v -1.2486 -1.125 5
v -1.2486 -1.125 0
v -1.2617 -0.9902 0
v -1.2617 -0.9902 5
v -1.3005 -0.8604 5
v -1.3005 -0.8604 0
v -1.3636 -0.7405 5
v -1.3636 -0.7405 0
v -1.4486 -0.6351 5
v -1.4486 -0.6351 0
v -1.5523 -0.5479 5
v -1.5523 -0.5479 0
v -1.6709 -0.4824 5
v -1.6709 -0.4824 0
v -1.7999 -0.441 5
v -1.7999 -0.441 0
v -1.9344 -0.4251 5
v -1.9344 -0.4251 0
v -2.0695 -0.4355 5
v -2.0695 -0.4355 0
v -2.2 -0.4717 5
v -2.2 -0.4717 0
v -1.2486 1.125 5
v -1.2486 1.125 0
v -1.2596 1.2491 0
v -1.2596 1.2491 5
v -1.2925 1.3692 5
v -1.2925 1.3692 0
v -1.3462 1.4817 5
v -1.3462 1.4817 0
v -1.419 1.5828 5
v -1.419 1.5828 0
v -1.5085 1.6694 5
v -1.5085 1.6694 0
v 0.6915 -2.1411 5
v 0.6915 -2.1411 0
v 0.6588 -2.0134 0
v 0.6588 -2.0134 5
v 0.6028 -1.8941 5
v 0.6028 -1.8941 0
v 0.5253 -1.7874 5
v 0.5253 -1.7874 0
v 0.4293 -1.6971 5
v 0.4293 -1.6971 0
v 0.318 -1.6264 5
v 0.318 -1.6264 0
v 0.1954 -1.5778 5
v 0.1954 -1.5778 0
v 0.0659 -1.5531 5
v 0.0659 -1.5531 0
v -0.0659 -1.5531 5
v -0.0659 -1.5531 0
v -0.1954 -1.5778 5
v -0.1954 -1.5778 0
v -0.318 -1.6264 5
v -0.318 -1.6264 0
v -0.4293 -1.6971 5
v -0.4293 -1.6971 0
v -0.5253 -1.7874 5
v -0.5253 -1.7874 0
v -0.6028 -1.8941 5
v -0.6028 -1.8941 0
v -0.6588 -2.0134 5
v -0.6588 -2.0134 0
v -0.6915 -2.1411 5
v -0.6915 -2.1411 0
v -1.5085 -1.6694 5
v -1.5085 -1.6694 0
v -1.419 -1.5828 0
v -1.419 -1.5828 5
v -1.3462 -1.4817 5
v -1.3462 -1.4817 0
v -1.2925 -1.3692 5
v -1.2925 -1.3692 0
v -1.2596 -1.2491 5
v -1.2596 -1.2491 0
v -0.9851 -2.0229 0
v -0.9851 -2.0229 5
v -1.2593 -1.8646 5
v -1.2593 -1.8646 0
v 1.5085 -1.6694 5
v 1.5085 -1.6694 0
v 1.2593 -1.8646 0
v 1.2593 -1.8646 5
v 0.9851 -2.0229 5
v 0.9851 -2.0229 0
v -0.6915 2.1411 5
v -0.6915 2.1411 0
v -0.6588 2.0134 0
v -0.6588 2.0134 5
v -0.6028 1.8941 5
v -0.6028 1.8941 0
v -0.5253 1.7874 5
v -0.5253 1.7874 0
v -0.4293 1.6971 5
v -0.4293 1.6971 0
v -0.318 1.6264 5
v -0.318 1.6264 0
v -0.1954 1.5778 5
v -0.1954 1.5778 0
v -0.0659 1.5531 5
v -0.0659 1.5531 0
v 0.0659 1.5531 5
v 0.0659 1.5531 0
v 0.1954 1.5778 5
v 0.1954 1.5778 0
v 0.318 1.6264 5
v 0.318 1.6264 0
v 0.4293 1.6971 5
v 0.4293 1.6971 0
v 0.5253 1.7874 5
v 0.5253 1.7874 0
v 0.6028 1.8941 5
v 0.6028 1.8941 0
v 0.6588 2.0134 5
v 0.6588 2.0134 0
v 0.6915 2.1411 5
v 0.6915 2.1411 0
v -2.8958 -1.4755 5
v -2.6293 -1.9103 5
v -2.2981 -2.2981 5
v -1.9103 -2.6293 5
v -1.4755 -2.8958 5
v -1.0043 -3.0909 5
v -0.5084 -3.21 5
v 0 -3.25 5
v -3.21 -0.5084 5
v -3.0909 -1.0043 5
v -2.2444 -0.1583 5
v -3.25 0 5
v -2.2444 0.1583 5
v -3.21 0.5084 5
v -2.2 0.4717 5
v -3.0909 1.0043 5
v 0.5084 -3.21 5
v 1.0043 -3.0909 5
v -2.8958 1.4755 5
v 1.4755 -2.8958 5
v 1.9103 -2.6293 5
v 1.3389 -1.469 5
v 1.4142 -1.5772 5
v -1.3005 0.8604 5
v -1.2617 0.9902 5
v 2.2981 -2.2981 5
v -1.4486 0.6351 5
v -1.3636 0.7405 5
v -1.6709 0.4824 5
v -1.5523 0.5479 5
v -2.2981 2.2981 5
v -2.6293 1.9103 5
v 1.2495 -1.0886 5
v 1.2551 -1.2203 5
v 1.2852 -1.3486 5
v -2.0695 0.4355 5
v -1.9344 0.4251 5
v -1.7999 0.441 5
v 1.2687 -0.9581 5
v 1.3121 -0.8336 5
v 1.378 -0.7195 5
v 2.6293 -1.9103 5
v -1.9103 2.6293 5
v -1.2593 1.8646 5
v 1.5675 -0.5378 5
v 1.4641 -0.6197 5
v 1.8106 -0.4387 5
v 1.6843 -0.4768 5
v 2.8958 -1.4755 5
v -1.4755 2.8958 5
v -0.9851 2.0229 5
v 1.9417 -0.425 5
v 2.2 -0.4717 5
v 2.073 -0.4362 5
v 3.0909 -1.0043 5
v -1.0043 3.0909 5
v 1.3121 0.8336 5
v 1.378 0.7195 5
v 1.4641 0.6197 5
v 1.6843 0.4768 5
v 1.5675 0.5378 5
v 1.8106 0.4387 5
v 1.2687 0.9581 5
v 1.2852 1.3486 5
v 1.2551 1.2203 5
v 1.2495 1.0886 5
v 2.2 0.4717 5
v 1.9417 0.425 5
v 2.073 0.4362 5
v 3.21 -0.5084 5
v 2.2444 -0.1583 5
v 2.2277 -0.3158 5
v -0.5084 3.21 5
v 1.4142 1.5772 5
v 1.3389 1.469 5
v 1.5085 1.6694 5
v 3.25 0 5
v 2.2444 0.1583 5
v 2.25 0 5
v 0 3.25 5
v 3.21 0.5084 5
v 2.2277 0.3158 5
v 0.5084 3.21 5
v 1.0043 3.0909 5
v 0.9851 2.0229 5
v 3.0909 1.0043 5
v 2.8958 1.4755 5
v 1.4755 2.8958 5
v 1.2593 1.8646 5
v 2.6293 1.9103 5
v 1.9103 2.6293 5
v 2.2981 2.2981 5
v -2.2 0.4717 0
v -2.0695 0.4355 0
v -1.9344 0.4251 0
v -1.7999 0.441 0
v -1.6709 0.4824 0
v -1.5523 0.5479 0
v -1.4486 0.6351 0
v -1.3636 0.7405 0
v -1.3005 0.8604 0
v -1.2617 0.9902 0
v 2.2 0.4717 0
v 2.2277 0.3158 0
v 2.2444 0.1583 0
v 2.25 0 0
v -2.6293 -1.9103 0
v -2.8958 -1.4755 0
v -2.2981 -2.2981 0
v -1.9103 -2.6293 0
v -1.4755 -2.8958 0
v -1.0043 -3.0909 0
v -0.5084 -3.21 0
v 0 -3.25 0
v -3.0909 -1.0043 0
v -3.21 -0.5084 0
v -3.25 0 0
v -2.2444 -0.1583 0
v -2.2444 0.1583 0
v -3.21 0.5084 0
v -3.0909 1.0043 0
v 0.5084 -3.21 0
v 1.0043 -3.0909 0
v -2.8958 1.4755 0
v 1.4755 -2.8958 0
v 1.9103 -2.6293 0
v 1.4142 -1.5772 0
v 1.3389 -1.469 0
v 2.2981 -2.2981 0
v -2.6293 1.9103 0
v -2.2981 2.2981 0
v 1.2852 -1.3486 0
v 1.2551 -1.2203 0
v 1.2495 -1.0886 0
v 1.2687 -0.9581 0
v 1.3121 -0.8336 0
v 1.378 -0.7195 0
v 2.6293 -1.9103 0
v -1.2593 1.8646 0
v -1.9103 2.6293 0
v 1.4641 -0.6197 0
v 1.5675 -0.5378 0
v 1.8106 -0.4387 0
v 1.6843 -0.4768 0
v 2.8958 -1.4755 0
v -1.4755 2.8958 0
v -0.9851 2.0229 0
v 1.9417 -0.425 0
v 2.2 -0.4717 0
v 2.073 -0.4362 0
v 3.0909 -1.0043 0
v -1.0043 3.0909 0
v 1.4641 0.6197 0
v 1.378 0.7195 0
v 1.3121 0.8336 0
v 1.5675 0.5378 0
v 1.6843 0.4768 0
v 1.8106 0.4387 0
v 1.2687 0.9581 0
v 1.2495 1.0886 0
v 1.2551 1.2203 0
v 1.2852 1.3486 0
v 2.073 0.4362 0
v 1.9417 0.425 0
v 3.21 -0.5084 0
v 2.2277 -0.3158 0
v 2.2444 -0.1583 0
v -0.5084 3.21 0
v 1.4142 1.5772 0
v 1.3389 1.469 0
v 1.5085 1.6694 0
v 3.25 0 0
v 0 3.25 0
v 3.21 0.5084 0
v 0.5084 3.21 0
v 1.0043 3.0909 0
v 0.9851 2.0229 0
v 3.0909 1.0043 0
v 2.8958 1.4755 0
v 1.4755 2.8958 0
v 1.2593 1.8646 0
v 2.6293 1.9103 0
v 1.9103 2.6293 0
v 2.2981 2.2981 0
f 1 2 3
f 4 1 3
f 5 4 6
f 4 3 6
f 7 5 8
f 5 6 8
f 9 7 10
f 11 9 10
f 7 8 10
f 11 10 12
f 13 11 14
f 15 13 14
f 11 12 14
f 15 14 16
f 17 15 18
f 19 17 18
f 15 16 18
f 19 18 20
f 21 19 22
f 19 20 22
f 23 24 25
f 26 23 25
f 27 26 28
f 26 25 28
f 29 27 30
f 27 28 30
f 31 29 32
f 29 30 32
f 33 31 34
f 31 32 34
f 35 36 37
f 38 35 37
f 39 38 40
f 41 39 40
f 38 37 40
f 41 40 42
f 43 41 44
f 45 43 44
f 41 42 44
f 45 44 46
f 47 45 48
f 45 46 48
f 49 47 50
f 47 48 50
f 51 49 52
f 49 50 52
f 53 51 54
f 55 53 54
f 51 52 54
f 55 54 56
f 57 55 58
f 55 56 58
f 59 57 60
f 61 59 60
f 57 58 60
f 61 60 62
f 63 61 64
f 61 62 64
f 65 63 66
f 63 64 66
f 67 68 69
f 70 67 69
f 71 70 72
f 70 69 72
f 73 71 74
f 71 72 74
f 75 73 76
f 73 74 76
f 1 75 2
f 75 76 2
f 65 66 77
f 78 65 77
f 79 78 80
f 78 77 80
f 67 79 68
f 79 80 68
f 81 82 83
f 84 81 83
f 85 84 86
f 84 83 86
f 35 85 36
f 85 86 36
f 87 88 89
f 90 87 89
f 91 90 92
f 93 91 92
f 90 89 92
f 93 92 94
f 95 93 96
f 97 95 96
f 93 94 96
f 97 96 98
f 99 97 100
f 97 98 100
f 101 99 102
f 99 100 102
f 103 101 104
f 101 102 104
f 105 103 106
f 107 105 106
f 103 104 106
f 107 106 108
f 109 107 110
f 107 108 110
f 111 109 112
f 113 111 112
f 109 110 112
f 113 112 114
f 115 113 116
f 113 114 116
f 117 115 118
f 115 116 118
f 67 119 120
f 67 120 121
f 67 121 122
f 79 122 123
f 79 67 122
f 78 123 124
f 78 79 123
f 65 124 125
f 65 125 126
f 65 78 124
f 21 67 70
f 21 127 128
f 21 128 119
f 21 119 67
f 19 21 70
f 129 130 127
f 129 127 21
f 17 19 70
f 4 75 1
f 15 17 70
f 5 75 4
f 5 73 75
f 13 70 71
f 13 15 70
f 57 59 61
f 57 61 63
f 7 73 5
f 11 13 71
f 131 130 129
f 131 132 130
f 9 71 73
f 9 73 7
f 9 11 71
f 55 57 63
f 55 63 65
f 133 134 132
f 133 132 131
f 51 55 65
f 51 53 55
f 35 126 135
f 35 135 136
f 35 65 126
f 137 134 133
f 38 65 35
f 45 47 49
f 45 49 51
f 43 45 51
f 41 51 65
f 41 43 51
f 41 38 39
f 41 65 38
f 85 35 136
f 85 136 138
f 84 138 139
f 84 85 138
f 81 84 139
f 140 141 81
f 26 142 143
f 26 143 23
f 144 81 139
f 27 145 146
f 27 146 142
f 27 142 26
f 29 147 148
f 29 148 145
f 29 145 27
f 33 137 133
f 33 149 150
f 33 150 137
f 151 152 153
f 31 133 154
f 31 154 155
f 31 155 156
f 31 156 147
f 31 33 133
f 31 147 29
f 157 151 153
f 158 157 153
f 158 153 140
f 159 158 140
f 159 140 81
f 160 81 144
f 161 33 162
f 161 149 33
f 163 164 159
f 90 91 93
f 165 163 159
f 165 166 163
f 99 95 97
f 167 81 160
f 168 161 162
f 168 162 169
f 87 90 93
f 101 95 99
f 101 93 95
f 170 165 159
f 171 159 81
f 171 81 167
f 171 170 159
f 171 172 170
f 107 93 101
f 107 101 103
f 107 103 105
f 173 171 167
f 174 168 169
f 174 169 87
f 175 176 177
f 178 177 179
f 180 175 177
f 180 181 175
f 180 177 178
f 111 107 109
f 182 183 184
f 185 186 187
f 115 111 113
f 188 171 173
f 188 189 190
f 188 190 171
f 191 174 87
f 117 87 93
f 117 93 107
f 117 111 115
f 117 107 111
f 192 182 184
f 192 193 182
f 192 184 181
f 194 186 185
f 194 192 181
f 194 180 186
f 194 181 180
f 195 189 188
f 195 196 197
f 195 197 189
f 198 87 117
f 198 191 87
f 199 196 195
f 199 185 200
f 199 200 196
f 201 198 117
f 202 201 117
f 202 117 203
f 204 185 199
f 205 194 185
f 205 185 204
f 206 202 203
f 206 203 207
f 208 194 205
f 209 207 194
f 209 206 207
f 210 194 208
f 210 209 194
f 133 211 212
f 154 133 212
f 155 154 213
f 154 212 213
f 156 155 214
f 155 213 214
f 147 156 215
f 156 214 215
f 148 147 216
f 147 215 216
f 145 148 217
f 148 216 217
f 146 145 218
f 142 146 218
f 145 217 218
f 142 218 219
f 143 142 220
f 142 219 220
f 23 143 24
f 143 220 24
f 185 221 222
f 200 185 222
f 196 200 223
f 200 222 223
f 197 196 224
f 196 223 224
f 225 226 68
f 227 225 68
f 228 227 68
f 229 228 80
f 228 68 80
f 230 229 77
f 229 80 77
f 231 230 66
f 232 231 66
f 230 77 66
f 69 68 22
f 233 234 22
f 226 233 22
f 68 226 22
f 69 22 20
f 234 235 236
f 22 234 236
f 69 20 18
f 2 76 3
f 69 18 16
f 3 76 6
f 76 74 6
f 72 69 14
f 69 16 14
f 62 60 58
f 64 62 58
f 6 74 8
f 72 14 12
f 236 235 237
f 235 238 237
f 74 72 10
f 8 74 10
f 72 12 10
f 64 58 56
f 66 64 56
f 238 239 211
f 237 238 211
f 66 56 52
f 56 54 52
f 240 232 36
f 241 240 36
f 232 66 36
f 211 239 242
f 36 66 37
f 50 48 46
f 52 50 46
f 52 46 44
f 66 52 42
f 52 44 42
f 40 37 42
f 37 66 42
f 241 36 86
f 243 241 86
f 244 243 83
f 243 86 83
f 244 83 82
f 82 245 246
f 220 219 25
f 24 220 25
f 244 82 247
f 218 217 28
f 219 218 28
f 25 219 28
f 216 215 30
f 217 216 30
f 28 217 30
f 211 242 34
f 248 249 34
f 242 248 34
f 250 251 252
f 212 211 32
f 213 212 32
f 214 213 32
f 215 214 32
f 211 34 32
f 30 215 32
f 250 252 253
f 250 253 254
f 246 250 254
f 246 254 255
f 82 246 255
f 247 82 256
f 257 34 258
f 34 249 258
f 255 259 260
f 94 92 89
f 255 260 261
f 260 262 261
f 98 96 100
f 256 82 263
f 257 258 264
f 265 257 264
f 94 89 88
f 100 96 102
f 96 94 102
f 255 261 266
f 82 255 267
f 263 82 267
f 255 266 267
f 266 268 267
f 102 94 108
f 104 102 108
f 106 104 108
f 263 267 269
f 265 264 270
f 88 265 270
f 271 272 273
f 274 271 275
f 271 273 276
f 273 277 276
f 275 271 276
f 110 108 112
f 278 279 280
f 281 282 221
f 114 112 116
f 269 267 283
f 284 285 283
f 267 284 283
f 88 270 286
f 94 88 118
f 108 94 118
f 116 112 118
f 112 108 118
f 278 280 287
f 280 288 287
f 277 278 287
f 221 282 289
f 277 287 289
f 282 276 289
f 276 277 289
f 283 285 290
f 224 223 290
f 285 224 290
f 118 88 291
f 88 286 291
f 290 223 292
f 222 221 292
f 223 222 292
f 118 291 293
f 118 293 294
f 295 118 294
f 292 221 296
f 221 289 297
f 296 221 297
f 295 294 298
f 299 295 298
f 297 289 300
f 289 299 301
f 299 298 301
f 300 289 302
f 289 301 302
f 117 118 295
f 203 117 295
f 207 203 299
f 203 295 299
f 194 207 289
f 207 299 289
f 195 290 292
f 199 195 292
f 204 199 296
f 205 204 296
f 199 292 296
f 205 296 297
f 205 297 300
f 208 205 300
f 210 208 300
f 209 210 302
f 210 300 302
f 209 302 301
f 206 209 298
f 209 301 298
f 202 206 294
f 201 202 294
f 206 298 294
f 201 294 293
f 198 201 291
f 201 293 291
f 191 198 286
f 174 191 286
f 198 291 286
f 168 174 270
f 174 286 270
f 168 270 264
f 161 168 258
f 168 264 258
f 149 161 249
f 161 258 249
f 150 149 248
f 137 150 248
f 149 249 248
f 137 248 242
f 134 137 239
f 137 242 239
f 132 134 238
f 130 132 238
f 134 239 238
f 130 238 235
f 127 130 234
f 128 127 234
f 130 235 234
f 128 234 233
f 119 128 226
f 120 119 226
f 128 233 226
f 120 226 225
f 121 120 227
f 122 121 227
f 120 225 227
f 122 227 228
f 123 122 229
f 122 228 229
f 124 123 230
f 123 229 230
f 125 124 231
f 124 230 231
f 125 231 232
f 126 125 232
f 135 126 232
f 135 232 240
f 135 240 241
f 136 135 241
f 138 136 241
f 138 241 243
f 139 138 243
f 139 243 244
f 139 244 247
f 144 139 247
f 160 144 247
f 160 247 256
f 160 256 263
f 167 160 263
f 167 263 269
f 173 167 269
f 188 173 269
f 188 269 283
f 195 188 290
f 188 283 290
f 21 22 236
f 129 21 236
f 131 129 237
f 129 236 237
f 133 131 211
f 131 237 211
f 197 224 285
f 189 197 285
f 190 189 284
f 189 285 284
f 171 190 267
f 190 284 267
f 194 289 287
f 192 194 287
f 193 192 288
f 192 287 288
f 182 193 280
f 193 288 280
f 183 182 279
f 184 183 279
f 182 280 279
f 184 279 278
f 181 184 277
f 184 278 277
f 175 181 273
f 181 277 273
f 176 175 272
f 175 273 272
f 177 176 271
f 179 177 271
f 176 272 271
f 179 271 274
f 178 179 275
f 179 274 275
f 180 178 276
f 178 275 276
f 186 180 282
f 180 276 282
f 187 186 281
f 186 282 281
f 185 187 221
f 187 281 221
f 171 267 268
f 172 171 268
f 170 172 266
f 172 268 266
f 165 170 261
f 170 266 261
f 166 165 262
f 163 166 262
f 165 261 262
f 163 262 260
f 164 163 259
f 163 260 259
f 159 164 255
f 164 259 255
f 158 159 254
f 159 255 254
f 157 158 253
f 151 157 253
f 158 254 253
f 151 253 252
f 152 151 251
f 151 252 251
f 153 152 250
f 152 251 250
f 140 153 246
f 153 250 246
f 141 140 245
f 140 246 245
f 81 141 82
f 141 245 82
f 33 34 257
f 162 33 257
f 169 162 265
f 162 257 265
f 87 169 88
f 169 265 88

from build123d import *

# Parameters (mm, degrees)
F0_R     = 3.25
F1_DEPTH = 5


with BuildPart() as f1:
    # F0 (on Top) → F1 (new body)
    with BuildSketch(Plane.XY):
        Circle(F0_R)
        with BuildLine():
            ThreePointArc((2.1999961154, 0.4717171738), (2.2374641069, 0.2371800374), (2.25, 0))
            ThreePointArc((2.25, 0), (2.2374641069, -0.2371800374), (2.1999961154, -0.4717171738))
            ThreePointArc((2.1999961154, -0.4717171738), (2.5256218299, -0.7287723318), (2.6485571585, -1.125))
            ThreePointArc((2.6485571585, -1.125), (2.2501959894, -1.7566755621), (1.5085171137, -1.6693939373))
            ThreePointArc((1.5085171137, -1.6693939373), (1.125, -1.9485571585), (0.6914790018, -2.1411111111))
            ThreePointArc((0.6914790018, -2.1411111111), (0.6978664991, -2.1953891093), (0.7, -2.25))
            ThreePointArc((0.7, -2.25), (-0.0546108907, -2.9478664991), (-0.6914790018, -2.1411111111))
            ThreePointArc((-0.6914790018, -2.1411111111), (-1.125, -1.9485571585), (-1.5085171137, -1.6693939373))
            ThreePointArc((-1.5085171137, -1.6693939373), (-2.5547749412, -1.475), (-2.1999961154, -0.4717171738))
            ThreePointArc((-2.1999961154, -0.4717171738), (-2.25, 0), (-2.1999961154, 0.4717171738))
            ThreePointArc((-2.1999961154, 0.4717171738), (-2.5547749412, 1.475), (-1.5085171137, 1.6693939373))
            ThreePointArc((-1.5085171137, 1.6693939373), (-1.125, 1.9485571585), (-0.6914790018, 2.1411111111))
            ThreePointArc((-0.6914790018, 2.1411111111), (-0.0546108907, 2.9478664991), (0.7, 2.25))
            ThreePointArc((0.7, 2.25), (0.6978664991, 2.1953891093), (0.6914790018, 2.1411111111))
            ThreePointArc((0.6914790018, 2.1411111111), (1.125, 1.9485571585), (1.5085171137, 1.6693939373))
            ThreePointArc((1.5085171137, 1.6693939373), (2.2501959894, 1.7566755621), (2.6485571585, 1.125))
            ThreePointArc((2.6485571585, 1.125), (2.5256218299, 0.7287723318), (2.1999961154, 0.4717171738))
        make_face(mode=Mode.SUBTRACT)
        with BuildLine():
            ThreePointArc((1.5085171137, 1.6693939373), (1.9485571585, 1.125), (2.1999961154, 0.4717171738))
            ThreePointArc((2.1999961154, 0.4717171738), (2.5256218299, 0.7287723318), (2.6485571585, 1.125))
            ThreePointArc((2.6485571585, 1.125), (2.2501959894, 1.7566755621), (1.5085171137, 1.6693939373))
        make_face()
        with BuildLine():
            ThreePointArc((2.6485571585, -1.125), (2.5256218299, -0.7287723318), (2.1999961154, -0.4717171738))
            ThreePointArc((2.1999961154, -0.4717171738), (1.9485571585, -1.125), (1.5085171137, -1.6693939373))
            ThreePointArc((1.5085171137, -1.6693939373), (2.2501959894, -1.7566755621), (2.6485571585, -1.125))
        make_face()
        with BuildLine():
            ThreePointArc((-0.6914790018, 2.1411111111), (0, 2.25), (0.6914790018, 2.1411111111))
            ThreePointArc((0.6914790018, 2.1411111111), (0.6978664991, 2.1953891093), (0.7, 2.25))
            ThreePointArc((0.7, 2.25), (-0.0546108907, 2.9478664991), (-0.6914790018, 2.1411111111))
        make_face()
        with BuildLine():
            ThreePointArc((0.7, -2.25), (0.6978664991, -2.1953891093), (0.6914790018, -2.1411111111))
            ThreePointArc((0.6914790018, -2.1411111111), (0, -2.25), (-0.6914790018, -2.1411111111))
            ThreePointArc((-0.6914790018, -2.1411111111), (-0.0546108907, -2.9478664991), (0.7, -2.25))
        make_face()
        with BuildLine():
            ThreePointArc((-2.1999961154, 0.4717171738), (-1.9485571585, 1.125), (-1.5085171137, 1.6693939373))
            ThreePointArc((-1.5085171137, 1.6693939373), (-2.5547749412, 1.475), (-2.1999961154, 0.4717171738))
        make_face()
        with BuildLine():
            ThreePointArc((-2.1999961154, -0.4717171738), (-2.5547749412, -1.475), (-1.5085171137, -1.6693939373))
            ThreePointArc((-1.5085171137, -1.6693939373), (-1.9485571585, -1.125), (-2.1999961154, -0.4717171738))
        make_face()
        with BuildLine():
            ThreePointArc((1.5085171137, 1.6693939373), (1.3423393759, 0.775), (2.1999961154, 0.4717171738))
            ThreePointArc((2.1999961154, 0.4717171738), (1.9485571585, 1.125), (1.5085171137, 1.6693939373))
        make_face()
        with BuildLine():
            ThreePointArc((1.5085171137, -1.6693939373), (1.9485571585, -1.125), (2.1999961154, -0.4717171738))
            ThreePointArc((2.1999961154, -0.4717171738), (1.3423393759, -0.775), (1.5085171137, -1.6693939373))
        make_face()
        with BuildLine():
            ThreePointArc((-0.6914790018, 2.1411111111), (0, 1.55), (0.6914790018, 2.1411111111))
            ThreePointArc((0.6914790018, 2.1411111111), (0, 2.25), (-0.6914790018, 2.1411111111))
        make_face()
        with BuildLine():
            ThreePointArc((-0.6914790018, -2.1411111111), (0, -2.25), (0.6914790018, -2.1411111111))
            ThreePointArc((0.6914790018, -2.1411111111), (0, -1.55), (-0.6914790018, -2.1411111111))
        make_face()
        with BuildLine():
            ThreePointArc((-1.2485571585, 1.125), (-1.3168815965, 1.4266388309), (-1.5085171137, 1.6693939373))
            ThreePointArc((-1.5085171137, 1.6693939373), (-1.9485571585, 1.125), (-2.1999961154, 0.4717171738))
            ThreePointArc((-2.1999961154, 0.4717171738), (-1.5523294903, 0.5479353287), (-1.2485571585, 1.125))
        make_face()
        with BuildLine():
            ThreePointArc((-2.1999961154, -0.4717171738), (-1.9485571585, -1.125), (-1.5085171137, -1.6693939373))
            ThreePointArc((-1.5085171137, -1.6693939373), (-1.3168815965, -1.4266388309), (-1.2485571585, -1.125))
            ThreePointArc((-1.2485571585, -1.125), (-1.5523294903, -0.5479353287), (-2.1999961154, -0.4717171738))
        make_face()
    extrude(amount=F1_DEPTH)


solid = f1.part
